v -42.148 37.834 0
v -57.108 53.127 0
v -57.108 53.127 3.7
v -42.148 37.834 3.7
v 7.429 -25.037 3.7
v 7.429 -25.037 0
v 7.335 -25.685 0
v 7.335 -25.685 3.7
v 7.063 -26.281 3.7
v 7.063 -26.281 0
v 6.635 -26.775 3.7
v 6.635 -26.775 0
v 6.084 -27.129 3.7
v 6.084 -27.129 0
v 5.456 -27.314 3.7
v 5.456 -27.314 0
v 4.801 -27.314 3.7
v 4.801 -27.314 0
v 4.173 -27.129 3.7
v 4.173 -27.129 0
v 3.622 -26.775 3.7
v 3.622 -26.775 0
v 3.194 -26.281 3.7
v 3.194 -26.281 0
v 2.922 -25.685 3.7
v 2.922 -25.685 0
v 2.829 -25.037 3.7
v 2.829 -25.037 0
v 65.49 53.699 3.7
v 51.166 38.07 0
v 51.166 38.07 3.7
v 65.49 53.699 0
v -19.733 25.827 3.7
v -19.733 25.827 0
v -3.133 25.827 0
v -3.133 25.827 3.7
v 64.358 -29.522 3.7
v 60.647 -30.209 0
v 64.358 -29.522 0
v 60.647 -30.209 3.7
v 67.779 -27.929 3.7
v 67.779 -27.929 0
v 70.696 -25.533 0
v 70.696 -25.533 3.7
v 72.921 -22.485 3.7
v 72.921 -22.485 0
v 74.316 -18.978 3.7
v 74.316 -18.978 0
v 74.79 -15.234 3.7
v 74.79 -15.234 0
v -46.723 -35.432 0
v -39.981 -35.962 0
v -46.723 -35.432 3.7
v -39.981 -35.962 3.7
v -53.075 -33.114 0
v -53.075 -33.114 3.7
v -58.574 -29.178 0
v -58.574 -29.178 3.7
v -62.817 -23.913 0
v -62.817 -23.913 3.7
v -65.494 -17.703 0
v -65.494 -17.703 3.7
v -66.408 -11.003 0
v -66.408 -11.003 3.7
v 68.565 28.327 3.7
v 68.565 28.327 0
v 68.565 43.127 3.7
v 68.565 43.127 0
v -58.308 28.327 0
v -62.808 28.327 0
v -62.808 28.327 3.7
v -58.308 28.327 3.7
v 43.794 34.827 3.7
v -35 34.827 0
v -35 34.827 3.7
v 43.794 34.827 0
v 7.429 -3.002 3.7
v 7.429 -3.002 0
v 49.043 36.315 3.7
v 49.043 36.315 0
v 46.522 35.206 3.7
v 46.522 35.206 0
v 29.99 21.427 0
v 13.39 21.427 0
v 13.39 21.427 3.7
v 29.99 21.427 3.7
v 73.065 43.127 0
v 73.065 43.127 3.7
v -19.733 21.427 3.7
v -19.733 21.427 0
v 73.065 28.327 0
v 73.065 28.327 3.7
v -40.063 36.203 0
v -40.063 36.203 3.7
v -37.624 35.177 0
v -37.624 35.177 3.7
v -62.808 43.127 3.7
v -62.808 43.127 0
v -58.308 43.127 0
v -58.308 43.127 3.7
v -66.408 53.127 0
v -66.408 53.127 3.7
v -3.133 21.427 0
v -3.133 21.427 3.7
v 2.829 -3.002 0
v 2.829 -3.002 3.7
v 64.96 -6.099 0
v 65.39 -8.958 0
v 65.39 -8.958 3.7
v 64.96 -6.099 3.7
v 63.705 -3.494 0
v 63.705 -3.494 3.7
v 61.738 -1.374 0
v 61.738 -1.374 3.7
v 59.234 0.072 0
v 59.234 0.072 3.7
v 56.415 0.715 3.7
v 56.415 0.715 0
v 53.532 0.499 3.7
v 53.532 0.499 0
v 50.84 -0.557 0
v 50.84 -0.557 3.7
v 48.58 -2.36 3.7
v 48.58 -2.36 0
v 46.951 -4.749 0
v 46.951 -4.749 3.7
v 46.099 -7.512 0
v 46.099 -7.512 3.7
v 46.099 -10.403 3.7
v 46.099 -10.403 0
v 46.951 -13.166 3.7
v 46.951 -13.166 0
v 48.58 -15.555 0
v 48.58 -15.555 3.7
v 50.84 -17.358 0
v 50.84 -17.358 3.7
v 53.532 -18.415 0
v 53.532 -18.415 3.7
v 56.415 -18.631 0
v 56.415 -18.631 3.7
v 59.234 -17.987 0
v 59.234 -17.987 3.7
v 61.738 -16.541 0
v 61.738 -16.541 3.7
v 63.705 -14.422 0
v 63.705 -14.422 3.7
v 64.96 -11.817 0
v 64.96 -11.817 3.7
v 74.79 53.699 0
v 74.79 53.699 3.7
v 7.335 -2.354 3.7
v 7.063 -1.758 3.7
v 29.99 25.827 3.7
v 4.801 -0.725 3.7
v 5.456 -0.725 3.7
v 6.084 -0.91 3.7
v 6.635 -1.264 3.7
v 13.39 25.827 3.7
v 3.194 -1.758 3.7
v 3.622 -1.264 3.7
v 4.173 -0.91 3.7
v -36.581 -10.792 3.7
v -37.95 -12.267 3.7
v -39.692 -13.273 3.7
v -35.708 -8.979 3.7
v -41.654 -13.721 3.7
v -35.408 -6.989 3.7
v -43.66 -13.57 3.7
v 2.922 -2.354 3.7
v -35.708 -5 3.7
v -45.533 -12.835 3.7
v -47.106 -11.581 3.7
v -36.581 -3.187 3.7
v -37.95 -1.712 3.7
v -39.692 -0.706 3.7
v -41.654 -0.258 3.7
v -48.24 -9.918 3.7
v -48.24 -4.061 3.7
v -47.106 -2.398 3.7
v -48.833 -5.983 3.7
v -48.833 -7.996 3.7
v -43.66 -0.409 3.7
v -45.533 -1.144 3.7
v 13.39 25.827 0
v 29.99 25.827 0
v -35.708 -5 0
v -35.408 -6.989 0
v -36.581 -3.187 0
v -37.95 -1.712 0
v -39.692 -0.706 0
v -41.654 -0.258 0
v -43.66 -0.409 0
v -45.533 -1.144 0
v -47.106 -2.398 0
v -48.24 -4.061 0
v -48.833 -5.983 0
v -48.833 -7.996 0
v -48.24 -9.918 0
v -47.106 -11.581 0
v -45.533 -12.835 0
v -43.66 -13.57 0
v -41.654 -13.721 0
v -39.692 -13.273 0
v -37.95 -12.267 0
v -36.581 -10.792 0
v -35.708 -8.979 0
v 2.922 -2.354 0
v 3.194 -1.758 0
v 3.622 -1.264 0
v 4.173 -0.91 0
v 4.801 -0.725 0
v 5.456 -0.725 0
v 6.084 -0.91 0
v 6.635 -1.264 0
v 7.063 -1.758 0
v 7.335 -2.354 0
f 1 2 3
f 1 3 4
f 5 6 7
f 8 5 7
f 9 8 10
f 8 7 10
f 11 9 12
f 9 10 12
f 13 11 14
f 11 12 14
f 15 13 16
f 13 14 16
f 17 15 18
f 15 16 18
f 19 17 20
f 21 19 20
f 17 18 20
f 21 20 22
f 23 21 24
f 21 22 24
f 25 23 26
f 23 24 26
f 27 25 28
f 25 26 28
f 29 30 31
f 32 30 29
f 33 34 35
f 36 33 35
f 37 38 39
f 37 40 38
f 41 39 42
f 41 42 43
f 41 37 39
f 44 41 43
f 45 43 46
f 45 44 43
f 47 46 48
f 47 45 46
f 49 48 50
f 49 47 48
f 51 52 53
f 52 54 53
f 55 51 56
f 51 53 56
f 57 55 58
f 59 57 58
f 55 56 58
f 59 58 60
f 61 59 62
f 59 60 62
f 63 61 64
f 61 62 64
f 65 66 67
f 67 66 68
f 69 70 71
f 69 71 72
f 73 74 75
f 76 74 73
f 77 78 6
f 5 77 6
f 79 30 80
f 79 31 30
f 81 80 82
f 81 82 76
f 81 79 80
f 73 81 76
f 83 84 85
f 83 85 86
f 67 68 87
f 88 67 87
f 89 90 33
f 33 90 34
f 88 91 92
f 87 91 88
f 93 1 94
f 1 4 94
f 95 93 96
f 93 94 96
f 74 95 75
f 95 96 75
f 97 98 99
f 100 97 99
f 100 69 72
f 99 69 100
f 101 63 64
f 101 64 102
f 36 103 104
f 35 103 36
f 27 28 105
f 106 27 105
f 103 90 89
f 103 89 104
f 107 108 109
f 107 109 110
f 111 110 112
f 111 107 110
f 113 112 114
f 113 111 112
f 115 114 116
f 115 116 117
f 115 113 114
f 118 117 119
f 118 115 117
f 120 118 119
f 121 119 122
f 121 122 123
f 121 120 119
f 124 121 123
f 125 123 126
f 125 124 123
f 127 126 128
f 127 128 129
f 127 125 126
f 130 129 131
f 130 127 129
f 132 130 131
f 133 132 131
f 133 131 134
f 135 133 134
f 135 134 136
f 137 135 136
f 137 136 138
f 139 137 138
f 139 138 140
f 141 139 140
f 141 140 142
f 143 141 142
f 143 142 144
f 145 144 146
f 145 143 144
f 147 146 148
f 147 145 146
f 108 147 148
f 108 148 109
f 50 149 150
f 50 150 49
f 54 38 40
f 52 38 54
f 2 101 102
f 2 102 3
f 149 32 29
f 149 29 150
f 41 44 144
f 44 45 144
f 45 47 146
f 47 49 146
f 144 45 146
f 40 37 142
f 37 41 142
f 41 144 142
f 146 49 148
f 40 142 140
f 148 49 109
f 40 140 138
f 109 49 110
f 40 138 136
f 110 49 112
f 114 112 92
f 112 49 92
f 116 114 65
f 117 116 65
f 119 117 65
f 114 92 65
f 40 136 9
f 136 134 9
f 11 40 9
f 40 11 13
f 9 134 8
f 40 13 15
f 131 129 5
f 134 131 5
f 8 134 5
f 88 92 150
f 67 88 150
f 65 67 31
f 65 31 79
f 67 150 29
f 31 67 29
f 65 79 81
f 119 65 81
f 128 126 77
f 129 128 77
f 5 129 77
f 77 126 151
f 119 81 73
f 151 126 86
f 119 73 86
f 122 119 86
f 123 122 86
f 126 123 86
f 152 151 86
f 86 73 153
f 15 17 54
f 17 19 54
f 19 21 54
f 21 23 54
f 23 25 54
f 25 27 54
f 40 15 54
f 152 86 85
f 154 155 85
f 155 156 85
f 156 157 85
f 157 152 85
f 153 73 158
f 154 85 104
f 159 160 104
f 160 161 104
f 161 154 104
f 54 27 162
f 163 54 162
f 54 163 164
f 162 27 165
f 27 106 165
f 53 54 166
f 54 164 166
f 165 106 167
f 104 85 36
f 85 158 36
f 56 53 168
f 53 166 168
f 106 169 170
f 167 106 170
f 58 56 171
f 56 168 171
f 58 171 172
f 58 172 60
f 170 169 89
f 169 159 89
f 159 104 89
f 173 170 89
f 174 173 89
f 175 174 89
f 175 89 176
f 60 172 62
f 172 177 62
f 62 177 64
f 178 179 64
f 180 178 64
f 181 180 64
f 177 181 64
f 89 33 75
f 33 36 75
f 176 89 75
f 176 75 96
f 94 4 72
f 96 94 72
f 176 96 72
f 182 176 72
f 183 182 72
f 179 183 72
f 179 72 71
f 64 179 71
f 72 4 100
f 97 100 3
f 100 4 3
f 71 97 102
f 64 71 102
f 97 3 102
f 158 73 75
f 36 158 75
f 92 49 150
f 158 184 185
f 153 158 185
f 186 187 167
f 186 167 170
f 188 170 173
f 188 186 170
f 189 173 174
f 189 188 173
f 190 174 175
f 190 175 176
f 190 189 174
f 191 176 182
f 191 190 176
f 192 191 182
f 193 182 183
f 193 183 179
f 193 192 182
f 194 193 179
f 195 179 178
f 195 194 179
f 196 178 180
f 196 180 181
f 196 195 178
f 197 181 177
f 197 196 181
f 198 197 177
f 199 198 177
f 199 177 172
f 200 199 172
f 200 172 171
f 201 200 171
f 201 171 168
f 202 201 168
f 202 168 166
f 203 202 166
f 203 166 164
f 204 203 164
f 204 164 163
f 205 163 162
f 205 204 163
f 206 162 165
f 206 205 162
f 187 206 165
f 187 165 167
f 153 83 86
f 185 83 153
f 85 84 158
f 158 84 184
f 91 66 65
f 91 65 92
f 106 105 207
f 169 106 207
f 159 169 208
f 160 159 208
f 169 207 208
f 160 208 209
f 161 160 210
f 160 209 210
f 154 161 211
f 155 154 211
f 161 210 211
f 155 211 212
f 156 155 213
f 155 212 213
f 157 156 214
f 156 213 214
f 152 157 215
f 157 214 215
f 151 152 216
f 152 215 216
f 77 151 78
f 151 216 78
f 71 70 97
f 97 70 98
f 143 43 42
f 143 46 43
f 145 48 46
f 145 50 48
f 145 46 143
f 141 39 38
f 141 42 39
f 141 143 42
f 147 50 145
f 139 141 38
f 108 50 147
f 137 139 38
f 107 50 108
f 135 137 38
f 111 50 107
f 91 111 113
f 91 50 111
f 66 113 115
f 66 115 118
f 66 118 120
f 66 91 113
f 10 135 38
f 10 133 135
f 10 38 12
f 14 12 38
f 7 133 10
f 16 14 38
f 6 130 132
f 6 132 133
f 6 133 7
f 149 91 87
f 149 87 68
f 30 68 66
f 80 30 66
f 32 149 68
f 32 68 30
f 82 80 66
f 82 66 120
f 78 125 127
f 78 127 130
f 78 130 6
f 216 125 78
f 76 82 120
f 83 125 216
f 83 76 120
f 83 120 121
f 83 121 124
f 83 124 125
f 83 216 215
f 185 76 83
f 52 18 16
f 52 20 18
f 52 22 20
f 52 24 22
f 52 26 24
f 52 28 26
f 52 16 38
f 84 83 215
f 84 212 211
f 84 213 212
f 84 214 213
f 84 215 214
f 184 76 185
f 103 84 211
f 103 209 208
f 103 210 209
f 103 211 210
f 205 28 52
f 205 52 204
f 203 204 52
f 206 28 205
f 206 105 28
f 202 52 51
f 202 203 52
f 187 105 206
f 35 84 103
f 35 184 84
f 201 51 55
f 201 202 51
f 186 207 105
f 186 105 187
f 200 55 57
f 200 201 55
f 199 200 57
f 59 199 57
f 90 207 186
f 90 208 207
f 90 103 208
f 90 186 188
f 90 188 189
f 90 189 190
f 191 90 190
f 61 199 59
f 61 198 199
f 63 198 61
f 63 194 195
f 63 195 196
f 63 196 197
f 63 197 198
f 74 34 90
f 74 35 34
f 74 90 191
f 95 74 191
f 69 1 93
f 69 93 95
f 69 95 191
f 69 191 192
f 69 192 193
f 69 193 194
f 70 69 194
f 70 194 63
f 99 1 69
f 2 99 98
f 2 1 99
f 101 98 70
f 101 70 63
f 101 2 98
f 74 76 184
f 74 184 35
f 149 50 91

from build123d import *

# Parameters (mm, degrees)
SKETCH2_R           = 9.7
SKETCH2_R_2         = 6.75
SKETCH2_W           = 4.5
SKETCH2_H           = 14.8
SKETCH2_W_2         = 16.6
SKETCH2_H_2         = 4.4
BOSS_EXTRUDE1_DEPTH = 3.7
FILLET1_R           = 15
FILLET2_R           = 25
FILLET3_R           = 10


with BuildPart() as part:
    # Sketch2 → Boss-Extrude1 (new body)
    with BuildSketch(Plane.XY):
        Polygon((-66.408376963, -37.473298429), (-66.408376963, 53.126701571), (-57.108376963, 53.126701571), (-39.206701064, 34.826701571), (48.193298936, 34.826701571), (65.490462758, 53.699118578), (74.790462758, 53.699118578), (74.790462758, -29.400881422), align=None)
        with Locations((55.690462758, -8.957731732)):
            Circle(SKETCH2_R, mode=Mode.SUBTRACT)
        with Locations((-42.158376963, -6.98947646)):
            Circle(SKETCH2_R_2, mode=Mode.SUBTRACT)
        with Locations((-60.558376963, 35.726701571)):
            Rectangle(SKETCH2_W, SKETCH2_H, mode=Mode.SUBTRACT)
        with Locations((70.815419874, 35.726701571)):
            Rectangle(SKETCH2_W, SKETCH2_H, mode=Mode.SUBTRACT)
        with Locations((-11.433419848, 23.626701571)):
            Rectangle(SKETCH2_W_2, SKETCH2_H_2, mode=Mode.SUBTRACT)
        with Locations((21.690462758, 23.626701571)):
            Rectangle(SKETCH2_W_2, SKETCH2_H_2, mode=Mode.SUBTRACT)
        with BuildLine():
            Line((7.428521455, -3.001867406), (7.428521455, -25.037089926))
            ThreePointArc((7.428521455, -25.037089926), (5.128521455, -27.337089926), (2.828521455, -25.037089926))
            Line((2.828521455, -25.037089926), (2.828521455, -3.001867406))
            ThreePointArc((2.828521455, -3.001867406), (5.128521455, -0.701867406), (7.428521455, -3.001867406))
        make_face(mode=Mode.SUBTRACT)
    extrude(amount=BOSS_EXTRUDE1_DEPTH)

    # Fillet1
    fillet1_edges = [part.edges().sort_by_distance(p)[0] for p in [
        (74.790462758, -29.400881422, 1.85),
    ]]
    fillet(fillet1_edges, radius=FILLET1_R)

    # Fillet2
    fillet2_edges = [part.edges().sort_by_distance(p)[0] for p in [
        (-66.408376963, -37.473298429, 1.85),
    ]]
    fillet(fillet2_edges, radius=FILLET2_R)

    # Fillet3
    fillet3_edges = [part.edges().sort_by_distance(p)[0] for p in [
        (-39.206701064, 34.826701571, 1.85),
        (48.193298936, 34.826701571, 1.85),
    ]]
    fillet(fillet3_edges, radius=FILLET3_R)


solid = part.part
